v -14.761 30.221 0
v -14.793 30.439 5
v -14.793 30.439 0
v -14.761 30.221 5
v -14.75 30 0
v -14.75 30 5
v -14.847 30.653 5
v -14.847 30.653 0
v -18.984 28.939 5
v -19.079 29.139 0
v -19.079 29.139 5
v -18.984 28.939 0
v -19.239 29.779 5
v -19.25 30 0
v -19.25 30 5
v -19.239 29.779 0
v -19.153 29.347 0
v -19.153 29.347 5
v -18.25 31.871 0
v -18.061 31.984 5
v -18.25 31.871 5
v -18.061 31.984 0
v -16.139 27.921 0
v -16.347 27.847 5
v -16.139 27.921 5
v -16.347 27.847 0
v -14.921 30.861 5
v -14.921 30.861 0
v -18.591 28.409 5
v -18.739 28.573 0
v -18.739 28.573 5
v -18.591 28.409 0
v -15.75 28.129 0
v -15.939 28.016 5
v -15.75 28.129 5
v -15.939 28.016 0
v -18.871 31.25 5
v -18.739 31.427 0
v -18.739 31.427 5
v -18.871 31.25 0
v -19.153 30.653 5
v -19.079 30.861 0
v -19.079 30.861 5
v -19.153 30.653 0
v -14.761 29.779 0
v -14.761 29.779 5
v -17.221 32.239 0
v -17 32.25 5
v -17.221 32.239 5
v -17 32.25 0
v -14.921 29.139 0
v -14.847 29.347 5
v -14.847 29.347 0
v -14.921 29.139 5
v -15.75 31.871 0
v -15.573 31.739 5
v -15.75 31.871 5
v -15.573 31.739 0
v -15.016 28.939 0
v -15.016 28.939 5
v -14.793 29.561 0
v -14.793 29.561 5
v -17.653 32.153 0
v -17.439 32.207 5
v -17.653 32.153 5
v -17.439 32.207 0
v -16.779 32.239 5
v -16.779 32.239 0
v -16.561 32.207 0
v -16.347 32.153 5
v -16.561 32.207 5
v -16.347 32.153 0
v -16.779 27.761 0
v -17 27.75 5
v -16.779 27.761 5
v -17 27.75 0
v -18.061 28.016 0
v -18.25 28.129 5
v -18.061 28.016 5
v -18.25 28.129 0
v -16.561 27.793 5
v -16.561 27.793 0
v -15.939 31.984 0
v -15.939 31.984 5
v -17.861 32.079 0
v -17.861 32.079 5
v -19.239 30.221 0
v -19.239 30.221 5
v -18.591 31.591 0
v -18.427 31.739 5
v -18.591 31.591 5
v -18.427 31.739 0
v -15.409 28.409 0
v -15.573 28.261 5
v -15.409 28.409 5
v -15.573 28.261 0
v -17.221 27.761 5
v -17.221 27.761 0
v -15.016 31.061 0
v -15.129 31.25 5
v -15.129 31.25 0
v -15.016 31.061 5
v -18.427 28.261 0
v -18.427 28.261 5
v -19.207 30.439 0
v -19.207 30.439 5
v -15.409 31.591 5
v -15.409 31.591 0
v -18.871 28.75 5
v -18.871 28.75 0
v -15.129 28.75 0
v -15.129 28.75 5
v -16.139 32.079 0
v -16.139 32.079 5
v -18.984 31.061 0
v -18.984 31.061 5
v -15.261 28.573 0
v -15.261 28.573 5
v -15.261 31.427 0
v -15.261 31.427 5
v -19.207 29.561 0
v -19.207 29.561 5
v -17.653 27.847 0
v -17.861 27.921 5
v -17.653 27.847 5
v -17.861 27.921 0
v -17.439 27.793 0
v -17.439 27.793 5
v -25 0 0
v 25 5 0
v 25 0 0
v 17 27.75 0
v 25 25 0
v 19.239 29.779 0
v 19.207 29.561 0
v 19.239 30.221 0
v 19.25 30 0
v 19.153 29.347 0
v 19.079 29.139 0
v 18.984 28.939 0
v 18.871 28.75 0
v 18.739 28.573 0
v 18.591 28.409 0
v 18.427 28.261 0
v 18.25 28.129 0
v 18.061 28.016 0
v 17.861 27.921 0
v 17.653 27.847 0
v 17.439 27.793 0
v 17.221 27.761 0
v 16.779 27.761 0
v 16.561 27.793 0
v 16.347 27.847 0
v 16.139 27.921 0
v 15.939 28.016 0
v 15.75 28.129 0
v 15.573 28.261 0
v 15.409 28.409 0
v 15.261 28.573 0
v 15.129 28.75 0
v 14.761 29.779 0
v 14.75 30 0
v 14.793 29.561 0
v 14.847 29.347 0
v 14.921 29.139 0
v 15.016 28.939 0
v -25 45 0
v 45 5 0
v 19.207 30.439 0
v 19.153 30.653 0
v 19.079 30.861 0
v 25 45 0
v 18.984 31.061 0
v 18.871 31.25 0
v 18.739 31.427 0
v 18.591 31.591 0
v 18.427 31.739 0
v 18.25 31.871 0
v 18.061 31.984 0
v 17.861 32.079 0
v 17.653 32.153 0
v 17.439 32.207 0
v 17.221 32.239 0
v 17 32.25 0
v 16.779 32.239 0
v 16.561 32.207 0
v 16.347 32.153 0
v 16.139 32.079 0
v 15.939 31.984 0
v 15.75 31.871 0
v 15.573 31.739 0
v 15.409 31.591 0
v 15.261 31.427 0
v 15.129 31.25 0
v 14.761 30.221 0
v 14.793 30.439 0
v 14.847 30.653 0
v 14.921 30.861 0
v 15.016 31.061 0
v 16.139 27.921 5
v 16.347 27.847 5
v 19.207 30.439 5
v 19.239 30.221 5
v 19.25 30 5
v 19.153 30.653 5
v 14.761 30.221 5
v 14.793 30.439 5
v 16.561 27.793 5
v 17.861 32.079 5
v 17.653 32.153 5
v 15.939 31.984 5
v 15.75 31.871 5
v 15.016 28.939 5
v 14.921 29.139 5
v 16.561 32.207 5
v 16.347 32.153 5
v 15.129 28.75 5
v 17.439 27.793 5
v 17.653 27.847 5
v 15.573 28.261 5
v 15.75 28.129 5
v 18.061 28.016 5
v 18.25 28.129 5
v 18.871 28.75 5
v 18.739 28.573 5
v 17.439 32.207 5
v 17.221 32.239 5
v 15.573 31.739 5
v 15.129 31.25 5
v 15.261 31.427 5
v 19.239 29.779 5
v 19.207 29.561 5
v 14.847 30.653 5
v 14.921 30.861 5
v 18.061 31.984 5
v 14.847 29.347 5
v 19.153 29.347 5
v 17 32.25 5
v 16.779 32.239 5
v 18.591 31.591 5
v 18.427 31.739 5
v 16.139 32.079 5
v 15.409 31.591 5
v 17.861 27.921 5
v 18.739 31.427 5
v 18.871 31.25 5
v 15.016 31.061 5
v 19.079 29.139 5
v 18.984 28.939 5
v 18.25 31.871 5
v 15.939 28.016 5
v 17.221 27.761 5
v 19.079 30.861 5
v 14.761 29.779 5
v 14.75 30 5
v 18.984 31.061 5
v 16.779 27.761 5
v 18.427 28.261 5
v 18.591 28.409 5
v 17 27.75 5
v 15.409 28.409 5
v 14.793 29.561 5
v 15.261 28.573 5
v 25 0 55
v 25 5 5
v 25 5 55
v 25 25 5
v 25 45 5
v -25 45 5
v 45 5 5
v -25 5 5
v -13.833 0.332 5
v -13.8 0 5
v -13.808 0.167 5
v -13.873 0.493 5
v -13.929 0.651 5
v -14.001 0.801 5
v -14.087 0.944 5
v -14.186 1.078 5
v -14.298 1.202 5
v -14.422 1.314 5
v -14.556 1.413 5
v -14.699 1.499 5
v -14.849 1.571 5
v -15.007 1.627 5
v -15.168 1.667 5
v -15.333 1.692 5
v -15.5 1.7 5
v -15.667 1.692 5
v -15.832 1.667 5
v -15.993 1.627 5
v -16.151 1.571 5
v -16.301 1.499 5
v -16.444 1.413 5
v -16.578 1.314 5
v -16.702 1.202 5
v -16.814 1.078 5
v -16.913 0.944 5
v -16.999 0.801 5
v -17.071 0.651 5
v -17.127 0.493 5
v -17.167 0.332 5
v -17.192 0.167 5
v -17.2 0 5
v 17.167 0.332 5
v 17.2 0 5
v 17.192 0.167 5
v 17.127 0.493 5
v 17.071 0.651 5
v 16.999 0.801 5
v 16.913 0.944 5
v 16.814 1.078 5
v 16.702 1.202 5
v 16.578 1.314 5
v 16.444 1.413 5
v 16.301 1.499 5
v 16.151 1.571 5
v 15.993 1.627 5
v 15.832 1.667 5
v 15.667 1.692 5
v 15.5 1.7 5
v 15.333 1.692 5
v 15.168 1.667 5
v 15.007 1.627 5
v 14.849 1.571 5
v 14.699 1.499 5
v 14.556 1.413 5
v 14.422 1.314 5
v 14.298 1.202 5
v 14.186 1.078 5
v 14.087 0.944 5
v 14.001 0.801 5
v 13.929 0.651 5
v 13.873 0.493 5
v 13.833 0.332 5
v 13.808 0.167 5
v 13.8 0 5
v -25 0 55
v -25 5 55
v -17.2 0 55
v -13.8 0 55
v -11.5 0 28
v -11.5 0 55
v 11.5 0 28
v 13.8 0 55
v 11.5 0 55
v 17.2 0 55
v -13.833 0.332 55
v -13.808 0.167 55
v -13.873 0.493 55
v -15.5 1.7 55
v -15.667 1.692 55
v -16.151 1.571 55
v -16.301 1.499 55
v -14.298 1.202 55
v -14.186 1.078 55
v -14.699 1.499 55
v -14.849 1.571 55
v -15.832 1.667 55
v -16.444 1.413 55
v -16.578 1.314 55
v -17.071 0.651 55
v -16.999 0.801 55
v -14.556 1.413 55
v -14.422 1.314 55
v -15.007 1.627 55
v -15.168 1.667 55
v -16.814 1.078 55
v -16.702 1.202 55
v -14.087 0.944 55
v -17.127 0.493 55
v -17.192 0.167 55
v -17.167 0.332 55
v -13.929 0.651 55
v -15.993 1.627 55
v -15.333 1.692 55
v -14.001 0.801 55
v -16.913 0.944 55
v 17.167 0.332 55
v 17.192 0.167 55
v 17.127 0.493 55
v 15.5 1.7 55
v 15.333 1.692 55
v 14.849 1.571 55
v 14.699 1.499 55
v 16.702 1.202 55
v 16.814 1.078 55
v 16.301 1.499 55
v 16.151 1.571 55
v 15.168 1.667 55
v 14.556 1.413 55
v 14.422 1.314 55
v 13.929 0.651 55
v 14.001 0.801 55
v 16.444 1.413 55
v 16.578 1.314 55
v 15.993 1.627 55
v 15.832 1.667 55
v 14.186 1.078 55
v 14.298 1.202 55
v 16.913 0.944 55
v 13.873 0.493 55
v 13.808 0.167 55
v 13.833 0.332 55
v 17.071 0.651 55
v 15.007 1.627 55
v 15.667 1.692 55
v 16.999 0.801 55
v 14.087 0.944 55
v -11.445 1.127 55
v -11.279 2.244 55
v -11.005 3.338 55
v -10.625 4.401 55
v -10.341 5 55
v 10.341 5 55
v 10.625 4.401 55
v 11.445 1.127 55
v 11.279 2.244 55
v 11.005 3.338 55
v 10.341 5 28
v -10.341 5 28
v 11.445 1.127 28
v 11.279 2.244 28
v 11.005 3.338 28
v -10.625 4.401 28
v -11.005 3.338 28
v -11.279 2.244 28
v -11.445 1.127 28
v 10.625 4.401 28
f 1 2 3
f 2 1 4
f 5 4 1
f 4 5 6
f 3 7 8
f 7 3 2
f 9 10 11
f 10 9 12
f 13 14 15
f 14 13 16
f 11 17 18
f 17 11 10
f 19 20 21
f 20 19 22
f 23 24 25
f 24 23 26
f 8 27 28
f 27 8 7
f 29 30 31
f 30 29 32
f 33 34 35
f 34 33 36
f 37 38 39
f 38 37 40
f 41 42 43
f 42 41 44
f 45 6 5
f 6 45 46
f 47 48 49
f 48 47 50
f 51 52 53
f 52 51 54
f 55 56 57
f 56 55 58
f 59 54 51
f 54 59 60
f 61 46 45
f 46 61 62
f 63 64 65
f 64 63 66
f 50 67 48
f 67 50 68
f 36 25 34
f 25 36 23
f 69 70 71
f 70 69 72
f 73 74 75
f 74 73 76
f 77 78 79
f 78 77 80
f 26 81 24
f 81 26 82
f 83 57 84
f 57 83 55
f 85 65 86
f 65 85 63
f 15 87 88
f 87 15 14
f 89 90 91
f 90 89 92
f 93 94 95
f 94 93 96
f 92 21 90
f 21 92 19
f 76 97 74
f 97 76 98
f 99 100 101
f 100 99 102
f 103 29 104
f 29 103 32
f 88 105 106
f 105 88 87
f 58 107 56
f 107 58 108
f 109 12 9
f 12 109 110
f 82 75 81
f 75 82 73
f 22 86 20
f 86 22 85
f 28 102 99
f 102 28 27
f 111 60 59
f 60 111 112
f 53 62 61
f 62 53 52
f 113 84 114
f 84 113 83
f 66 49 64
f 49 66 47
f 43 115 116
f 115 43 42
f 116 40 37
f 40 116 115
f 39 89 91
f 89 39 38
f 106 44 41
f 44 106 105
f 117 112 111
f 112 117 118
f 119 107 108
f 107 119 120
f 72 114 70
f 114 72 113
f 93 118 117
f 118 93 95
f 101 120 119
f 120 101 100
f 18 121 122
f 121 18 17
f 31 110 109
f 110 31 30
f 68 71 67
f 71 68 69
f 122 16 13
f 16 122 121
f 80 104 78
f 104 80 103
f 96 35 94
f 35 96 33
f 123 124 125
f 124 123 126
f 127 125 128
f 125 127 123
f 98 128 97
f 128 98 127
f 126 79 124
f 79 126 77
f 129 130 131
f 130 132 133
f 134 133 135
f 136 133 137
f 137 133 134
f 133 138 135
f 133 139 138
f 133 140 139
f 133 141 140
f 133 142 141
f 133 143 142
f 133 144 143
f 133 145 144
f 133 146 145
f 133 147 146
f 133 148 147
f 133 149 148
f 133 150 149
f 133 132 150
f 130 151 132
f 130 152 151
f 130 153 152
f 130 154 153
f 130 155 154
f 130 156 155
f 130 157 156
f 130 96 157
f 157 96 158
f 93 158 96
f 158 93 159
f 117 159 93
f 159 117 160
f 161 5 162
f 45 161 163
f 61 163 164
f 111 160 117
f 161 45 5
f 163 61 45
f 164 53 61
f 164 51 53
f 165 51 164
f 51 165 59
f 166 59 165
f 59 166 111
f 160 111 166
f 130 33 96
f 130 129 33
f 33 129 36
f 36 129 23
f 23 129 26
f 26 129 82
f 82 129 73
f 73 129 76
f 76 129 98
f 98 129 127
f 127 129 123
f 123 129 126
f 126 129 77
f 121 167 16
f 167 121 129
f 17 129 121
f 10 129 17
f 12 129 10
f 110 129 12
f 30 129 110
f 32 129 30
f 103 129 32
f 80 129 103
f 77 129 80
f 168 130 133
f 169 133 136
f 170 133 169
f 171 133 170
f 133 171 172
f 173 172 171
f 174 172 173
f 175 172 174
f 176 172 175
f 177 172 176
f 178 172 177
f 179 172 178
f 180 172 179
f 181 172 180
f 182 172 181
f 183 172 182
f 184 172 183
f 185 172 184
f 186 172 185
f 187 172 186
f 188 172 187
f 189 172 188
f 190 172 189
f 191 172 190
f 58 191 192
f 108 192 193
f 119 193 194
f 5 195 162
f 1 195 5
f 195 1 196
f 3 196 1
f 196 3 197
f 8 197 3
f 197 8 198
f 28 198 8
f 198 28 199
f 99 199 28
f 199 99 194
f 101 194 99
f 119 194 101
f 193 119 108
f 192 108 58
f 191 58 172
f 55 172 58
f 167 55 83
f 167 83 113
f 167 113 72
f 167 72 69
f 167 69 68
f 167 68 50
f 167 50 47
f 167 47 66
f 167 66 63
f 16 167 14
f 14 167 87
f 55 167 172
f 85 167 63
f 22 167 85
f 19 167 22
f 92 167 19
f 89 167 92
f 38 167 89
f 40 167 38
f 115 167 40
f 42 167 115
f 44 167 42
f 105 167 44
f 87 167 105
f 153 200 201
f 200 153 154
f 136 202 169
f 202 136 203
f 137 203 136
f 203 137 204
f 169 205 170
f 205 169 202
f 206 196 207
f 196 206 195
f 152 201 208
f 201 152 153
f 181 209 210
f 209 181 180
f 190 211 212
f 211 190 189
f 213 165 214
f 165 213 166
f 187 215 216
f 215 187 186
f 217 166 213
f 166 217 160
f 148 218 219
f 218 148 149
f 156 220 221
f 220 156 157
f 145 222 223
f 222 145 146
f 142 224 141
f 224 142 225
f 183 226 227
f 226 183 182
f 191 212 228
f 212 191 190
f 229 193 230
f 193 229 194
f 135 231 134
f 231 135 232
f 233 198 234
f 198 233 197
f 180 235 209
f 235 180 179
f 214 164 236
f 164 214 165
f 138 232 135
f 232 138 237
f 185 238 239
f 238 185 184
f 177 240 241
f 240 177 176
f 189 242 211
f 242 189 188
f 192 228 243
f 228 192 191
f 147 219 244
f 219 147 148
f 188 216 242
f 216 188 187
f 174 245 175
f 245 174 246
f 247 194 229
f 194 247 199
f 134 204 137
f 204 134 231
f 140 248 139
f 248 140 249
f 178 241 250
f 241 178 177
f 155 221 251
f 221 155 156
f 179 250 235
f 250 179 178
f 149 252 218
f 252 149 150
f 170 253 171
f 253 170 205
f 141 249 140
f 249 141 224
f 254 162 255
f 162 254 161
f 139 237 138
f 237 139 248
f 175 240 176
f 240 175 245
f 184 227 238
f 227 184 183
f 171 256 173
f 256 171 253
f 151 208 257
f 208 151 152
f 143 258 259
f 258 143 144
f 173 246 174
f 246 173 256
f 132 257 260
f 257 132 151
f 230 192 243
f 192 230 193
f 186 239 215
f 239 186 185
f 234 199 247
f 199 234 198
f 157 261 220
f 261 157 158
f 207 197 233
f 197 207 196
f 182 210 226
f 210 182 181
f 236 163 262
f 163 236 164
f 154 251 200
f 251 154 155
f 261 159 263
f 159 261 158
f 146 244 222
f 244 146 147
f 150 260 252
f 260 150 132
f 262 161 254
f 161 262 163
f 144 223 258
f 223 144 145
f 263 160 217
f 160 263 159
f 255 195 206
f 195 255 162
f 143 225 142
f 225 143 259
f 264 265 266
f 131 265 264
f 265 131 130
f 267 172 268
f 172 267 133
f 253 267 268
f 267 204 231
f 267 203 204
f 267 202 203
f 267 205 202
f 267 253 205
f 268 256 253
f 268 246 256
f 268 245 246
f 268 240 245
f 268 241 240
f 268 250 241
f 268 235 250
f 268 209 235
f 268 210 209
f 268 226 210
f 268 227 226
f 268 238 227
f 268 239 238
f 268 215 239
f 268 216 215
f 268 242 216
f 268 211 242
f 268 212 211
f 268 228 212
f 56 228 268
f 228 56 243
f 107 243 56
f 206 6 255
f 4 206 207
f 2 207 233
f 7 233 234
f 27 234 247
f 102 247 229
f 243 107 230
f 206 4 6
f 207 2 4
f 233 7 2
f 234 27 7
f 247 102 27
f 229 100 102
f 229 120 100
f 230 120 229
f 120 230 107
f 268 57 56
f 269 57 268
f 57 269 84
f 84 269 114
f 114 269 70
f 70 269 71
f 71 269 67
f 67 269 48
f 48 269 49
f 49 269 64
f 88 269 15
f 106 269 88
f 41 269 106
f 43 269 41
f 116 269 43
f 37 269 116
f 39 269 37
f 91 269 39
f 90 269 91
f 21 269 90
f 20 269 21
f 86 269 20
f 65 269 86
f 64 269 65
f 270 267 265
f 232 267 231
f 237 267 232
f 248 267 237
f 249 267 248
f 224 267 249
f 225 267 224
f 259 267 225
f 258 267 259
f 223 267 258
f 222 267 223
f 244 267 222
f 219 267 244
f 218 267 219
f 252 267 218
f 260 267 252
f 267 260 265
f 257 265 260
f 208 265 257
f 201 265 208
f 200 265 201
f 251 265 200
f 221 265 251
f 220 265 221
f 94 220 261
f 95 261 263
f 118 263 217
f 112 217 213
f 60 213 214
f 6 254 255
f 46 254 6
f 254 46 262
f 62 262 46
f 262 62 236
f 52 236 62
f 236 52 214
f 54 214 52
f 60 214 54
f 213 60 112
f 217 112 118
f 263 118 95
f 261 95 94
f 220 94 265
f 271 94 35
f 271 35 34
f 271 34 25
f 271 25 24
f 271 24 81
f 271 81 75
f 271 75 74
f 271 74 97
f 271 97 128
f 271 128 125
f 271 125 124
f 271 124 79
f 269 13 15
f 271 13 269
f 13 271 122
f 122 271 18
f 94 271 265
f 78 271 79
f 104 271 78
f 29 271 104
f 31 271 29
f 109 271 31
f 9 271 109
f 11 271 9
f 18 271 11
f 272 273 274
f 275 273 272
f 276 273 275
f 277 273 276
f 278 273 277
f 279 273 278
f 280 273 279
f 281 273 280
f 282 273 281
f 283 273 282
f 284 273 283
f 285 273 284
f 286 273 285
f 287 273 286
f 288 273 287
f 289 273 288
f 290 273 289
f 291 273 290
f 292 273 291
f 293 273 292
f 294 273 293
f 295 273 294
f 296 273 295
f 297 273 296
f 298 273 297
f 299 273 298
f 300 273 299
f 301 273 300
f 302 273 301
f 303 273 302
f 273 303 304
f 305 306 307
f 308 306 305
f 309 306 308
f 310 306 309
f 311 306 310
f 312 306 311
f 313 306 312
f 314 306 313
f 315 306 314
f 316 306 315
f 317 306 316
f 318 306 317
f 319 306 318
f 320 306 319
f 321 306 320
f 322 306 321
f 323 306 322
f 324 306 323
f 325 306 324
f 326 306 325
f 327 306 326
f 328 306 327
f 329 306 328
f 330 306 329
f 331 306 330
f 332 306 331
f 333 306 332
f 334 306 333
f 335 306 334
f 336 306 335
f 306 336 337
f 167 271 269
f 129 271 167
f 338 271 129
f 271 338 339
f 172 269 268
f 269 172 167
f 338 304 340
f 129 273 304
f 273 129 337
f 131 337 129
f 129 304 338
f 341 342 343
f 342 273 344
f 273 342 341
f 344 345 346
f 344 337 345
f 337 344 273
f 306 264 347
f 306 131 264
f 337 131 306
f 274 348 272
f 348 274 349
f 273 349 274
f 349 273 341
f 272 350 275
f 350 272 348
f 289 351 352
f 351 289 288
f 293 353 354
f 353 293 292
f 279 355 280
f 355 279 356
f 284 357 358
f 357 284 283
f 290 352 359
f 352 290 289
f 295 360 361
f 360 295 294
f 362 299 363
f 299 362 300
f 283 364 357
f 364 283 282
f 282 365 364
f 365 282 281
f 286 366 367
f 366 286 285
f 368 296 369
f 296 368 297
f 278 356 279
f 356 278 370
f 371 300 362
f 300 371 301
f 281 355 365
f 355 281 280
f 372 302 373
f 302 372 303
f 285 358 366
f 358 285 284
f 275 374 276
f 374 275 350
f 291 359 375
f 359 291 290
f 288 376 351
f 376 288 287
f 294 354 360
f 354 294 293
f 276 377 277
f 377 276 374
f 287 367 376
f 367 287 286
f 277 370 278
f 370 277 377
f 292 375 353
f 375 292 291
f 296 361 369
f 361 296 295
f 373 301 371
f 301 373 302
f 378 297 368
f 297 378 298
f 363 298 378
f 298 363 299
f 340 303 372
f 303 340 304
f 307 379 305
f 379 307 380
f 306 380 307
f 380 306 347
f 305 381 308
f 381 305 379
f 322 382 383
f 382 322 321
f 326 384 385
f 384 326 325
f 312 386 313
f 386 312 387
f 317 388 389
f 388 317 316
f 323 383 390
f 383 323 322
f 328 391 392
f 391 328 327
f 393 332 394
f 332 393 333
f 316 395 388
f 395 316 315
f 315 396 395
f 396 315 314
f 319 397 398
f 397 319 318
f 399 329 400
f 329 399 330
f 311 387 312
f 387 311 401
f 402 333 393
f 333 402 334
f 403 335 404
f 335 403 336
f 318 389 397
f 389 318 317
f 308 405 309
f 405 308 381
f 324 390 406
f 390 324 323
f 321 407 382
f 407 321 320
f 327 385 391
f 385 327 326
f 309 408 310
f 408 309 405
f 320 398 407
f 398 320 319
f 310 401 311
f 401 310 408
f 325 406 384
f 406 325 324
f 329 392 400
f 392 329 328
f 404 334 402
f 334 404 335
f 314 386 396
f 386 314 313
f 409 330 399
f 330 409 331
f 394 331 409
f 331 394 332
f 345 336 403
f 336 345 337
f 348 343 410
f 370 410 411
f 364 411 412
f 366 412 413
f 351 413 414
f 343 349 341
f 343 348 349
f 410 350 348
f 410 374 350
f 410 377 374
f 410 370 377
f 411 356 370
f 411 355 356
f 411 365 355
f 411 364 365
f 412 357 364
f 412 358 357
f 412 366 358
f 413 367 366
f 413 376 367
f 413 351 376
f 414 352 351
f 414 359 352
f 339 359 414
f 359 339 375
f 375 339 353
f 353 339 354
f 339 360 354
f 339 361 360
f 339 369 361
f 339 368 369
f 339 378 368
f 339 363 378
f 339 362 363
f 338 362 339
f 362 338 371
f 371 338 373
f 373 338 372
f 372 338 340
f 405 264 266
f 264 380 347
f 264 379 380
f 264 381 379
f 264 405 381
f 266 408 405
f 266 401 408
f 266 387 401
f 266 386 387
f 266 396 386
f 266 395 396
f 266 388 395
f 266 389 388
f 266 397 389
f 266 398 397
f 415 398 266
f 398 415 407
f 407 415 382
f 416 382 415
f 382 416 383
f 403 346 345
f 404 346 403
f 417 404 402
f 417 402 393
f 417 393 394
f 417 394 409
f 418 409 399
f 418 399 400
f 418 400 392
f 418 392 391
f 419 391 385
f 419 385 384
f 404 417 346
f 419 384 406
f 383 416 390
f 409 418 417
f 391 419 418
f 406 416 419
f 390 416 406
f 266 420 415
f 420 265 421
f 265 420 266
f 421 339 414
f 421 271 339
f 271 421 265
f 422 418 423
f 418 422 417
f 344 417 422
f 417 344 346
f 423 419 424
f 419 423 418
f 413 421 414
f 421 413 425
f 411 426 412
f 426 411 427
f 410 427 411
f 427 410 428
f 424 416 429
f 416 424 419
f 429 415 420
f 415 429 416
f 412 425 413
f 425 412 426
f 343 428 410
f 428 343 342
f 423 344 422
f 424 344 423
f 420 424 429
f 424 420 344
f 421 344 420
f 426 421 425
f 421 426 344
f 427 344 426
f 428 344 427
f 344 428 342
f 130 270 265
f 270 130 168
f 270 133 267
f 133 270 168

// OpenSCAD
// L-shaped mounting bracket for NEMA 17 stepper motor.
// Base plate: 50x45x5, Motor plate: 50x5x50, Gussets on sides.

$fn = 64;

// --- Dimensions ---
base_x = 50;
base_y = 45;
base_z = 5;

motor_x = 50;
motor_y = 5;
motor_z = 50;

m4_hole_d = 4.5;
m3_hole_d = 3.4;

gusset_thickness = 5;
gusset_leg_y = 20;
gusset_leg_z = 20;

boss_hole_d = 23;
boss_hole_z = 28;

// Gusset positions (flush with edges)
gusset_x_left = -25;
gusset_x_right = 20;

// Base mounting holes
base_hole_x1 = -17;
base_hole_y1 = 30;
base_hole_x2 = 17;
base_hole_y2 = 30;

// Motor plate boss hole
boss_hole_x = 0;

// Screw holes pattern
screw_pattern_size = 31;
screw_holes = [
    [-screw_pattern_size / 2, -screw_pattern_size / 2],
    [-screw_pattern_size / 2, screw_pattern_size / 2],
    [screw_pattern_size / 2, -screw_pattern_size / 2],
    [screw_pattern_size / 2, screw_pattern_size / 2]
];

// --- Build Base Plate ---
difference() {
    translate([-base_x / 2, 0, 0]) cube([base_x, base_y, base_z]);
    
    // Base mounting holes
    for (i = [0 : 1]) {
        translate([
            (i == 0) ? base_hole_x1 : base_hole_x2,
            (i == 0) ? base_hole_y1 : base_hole_y2,
            0
        ]) cylinder(h = base_z + 1, d = m4_hole_d);
    }
}

// --- Build Motor Plate ---
difference() {
    translate([-motor_x / 2, 0, base_z]) cube([motor_x, motor_y, motor_z]);
    
    // Boss hole
    translate([boss_hole_x, 0, boss_hole_z]) cylinder(h = motor_z + 1, d = boss_hole_d);
    
    // Screw holes
    for (p = screw_holes) {
        translate([p[0], 0, p[1]]) cylinder(h = motor_z + 1, d = m3_hole_d);
    }
}

// --- Build Left Gusset ---
// Right triangle in YZ plane, extruded along X.
// Vertices: (y=5, z=5), (y=25, z=5), (y=5, z=25).
// Extrude from x = -25 to x = -20.
translate([gusset_x_left, 0, 0]) {
    linear_extrude(height = gusset_thickness, center = false) {
        polygon([
            [5, 5],
            [25, 5],
            [5, 25]
        ]);
    }
}

// --- Build Right Gusset ---
// Right triangle in YZ plane, extruded along X.
// Vertices: (y=5, z=5), (y=25, z=5), (y=5, z=25).
// Extrude from x = 20 to x = 25.
translate([gusset_x_right, 0, 0]) {
    linear_extrude(height = gusset_thickness, center = false) {
        polygon([
            [5, 5],
            [25, 5],
            [5, 25]
        ]);
    }
}
